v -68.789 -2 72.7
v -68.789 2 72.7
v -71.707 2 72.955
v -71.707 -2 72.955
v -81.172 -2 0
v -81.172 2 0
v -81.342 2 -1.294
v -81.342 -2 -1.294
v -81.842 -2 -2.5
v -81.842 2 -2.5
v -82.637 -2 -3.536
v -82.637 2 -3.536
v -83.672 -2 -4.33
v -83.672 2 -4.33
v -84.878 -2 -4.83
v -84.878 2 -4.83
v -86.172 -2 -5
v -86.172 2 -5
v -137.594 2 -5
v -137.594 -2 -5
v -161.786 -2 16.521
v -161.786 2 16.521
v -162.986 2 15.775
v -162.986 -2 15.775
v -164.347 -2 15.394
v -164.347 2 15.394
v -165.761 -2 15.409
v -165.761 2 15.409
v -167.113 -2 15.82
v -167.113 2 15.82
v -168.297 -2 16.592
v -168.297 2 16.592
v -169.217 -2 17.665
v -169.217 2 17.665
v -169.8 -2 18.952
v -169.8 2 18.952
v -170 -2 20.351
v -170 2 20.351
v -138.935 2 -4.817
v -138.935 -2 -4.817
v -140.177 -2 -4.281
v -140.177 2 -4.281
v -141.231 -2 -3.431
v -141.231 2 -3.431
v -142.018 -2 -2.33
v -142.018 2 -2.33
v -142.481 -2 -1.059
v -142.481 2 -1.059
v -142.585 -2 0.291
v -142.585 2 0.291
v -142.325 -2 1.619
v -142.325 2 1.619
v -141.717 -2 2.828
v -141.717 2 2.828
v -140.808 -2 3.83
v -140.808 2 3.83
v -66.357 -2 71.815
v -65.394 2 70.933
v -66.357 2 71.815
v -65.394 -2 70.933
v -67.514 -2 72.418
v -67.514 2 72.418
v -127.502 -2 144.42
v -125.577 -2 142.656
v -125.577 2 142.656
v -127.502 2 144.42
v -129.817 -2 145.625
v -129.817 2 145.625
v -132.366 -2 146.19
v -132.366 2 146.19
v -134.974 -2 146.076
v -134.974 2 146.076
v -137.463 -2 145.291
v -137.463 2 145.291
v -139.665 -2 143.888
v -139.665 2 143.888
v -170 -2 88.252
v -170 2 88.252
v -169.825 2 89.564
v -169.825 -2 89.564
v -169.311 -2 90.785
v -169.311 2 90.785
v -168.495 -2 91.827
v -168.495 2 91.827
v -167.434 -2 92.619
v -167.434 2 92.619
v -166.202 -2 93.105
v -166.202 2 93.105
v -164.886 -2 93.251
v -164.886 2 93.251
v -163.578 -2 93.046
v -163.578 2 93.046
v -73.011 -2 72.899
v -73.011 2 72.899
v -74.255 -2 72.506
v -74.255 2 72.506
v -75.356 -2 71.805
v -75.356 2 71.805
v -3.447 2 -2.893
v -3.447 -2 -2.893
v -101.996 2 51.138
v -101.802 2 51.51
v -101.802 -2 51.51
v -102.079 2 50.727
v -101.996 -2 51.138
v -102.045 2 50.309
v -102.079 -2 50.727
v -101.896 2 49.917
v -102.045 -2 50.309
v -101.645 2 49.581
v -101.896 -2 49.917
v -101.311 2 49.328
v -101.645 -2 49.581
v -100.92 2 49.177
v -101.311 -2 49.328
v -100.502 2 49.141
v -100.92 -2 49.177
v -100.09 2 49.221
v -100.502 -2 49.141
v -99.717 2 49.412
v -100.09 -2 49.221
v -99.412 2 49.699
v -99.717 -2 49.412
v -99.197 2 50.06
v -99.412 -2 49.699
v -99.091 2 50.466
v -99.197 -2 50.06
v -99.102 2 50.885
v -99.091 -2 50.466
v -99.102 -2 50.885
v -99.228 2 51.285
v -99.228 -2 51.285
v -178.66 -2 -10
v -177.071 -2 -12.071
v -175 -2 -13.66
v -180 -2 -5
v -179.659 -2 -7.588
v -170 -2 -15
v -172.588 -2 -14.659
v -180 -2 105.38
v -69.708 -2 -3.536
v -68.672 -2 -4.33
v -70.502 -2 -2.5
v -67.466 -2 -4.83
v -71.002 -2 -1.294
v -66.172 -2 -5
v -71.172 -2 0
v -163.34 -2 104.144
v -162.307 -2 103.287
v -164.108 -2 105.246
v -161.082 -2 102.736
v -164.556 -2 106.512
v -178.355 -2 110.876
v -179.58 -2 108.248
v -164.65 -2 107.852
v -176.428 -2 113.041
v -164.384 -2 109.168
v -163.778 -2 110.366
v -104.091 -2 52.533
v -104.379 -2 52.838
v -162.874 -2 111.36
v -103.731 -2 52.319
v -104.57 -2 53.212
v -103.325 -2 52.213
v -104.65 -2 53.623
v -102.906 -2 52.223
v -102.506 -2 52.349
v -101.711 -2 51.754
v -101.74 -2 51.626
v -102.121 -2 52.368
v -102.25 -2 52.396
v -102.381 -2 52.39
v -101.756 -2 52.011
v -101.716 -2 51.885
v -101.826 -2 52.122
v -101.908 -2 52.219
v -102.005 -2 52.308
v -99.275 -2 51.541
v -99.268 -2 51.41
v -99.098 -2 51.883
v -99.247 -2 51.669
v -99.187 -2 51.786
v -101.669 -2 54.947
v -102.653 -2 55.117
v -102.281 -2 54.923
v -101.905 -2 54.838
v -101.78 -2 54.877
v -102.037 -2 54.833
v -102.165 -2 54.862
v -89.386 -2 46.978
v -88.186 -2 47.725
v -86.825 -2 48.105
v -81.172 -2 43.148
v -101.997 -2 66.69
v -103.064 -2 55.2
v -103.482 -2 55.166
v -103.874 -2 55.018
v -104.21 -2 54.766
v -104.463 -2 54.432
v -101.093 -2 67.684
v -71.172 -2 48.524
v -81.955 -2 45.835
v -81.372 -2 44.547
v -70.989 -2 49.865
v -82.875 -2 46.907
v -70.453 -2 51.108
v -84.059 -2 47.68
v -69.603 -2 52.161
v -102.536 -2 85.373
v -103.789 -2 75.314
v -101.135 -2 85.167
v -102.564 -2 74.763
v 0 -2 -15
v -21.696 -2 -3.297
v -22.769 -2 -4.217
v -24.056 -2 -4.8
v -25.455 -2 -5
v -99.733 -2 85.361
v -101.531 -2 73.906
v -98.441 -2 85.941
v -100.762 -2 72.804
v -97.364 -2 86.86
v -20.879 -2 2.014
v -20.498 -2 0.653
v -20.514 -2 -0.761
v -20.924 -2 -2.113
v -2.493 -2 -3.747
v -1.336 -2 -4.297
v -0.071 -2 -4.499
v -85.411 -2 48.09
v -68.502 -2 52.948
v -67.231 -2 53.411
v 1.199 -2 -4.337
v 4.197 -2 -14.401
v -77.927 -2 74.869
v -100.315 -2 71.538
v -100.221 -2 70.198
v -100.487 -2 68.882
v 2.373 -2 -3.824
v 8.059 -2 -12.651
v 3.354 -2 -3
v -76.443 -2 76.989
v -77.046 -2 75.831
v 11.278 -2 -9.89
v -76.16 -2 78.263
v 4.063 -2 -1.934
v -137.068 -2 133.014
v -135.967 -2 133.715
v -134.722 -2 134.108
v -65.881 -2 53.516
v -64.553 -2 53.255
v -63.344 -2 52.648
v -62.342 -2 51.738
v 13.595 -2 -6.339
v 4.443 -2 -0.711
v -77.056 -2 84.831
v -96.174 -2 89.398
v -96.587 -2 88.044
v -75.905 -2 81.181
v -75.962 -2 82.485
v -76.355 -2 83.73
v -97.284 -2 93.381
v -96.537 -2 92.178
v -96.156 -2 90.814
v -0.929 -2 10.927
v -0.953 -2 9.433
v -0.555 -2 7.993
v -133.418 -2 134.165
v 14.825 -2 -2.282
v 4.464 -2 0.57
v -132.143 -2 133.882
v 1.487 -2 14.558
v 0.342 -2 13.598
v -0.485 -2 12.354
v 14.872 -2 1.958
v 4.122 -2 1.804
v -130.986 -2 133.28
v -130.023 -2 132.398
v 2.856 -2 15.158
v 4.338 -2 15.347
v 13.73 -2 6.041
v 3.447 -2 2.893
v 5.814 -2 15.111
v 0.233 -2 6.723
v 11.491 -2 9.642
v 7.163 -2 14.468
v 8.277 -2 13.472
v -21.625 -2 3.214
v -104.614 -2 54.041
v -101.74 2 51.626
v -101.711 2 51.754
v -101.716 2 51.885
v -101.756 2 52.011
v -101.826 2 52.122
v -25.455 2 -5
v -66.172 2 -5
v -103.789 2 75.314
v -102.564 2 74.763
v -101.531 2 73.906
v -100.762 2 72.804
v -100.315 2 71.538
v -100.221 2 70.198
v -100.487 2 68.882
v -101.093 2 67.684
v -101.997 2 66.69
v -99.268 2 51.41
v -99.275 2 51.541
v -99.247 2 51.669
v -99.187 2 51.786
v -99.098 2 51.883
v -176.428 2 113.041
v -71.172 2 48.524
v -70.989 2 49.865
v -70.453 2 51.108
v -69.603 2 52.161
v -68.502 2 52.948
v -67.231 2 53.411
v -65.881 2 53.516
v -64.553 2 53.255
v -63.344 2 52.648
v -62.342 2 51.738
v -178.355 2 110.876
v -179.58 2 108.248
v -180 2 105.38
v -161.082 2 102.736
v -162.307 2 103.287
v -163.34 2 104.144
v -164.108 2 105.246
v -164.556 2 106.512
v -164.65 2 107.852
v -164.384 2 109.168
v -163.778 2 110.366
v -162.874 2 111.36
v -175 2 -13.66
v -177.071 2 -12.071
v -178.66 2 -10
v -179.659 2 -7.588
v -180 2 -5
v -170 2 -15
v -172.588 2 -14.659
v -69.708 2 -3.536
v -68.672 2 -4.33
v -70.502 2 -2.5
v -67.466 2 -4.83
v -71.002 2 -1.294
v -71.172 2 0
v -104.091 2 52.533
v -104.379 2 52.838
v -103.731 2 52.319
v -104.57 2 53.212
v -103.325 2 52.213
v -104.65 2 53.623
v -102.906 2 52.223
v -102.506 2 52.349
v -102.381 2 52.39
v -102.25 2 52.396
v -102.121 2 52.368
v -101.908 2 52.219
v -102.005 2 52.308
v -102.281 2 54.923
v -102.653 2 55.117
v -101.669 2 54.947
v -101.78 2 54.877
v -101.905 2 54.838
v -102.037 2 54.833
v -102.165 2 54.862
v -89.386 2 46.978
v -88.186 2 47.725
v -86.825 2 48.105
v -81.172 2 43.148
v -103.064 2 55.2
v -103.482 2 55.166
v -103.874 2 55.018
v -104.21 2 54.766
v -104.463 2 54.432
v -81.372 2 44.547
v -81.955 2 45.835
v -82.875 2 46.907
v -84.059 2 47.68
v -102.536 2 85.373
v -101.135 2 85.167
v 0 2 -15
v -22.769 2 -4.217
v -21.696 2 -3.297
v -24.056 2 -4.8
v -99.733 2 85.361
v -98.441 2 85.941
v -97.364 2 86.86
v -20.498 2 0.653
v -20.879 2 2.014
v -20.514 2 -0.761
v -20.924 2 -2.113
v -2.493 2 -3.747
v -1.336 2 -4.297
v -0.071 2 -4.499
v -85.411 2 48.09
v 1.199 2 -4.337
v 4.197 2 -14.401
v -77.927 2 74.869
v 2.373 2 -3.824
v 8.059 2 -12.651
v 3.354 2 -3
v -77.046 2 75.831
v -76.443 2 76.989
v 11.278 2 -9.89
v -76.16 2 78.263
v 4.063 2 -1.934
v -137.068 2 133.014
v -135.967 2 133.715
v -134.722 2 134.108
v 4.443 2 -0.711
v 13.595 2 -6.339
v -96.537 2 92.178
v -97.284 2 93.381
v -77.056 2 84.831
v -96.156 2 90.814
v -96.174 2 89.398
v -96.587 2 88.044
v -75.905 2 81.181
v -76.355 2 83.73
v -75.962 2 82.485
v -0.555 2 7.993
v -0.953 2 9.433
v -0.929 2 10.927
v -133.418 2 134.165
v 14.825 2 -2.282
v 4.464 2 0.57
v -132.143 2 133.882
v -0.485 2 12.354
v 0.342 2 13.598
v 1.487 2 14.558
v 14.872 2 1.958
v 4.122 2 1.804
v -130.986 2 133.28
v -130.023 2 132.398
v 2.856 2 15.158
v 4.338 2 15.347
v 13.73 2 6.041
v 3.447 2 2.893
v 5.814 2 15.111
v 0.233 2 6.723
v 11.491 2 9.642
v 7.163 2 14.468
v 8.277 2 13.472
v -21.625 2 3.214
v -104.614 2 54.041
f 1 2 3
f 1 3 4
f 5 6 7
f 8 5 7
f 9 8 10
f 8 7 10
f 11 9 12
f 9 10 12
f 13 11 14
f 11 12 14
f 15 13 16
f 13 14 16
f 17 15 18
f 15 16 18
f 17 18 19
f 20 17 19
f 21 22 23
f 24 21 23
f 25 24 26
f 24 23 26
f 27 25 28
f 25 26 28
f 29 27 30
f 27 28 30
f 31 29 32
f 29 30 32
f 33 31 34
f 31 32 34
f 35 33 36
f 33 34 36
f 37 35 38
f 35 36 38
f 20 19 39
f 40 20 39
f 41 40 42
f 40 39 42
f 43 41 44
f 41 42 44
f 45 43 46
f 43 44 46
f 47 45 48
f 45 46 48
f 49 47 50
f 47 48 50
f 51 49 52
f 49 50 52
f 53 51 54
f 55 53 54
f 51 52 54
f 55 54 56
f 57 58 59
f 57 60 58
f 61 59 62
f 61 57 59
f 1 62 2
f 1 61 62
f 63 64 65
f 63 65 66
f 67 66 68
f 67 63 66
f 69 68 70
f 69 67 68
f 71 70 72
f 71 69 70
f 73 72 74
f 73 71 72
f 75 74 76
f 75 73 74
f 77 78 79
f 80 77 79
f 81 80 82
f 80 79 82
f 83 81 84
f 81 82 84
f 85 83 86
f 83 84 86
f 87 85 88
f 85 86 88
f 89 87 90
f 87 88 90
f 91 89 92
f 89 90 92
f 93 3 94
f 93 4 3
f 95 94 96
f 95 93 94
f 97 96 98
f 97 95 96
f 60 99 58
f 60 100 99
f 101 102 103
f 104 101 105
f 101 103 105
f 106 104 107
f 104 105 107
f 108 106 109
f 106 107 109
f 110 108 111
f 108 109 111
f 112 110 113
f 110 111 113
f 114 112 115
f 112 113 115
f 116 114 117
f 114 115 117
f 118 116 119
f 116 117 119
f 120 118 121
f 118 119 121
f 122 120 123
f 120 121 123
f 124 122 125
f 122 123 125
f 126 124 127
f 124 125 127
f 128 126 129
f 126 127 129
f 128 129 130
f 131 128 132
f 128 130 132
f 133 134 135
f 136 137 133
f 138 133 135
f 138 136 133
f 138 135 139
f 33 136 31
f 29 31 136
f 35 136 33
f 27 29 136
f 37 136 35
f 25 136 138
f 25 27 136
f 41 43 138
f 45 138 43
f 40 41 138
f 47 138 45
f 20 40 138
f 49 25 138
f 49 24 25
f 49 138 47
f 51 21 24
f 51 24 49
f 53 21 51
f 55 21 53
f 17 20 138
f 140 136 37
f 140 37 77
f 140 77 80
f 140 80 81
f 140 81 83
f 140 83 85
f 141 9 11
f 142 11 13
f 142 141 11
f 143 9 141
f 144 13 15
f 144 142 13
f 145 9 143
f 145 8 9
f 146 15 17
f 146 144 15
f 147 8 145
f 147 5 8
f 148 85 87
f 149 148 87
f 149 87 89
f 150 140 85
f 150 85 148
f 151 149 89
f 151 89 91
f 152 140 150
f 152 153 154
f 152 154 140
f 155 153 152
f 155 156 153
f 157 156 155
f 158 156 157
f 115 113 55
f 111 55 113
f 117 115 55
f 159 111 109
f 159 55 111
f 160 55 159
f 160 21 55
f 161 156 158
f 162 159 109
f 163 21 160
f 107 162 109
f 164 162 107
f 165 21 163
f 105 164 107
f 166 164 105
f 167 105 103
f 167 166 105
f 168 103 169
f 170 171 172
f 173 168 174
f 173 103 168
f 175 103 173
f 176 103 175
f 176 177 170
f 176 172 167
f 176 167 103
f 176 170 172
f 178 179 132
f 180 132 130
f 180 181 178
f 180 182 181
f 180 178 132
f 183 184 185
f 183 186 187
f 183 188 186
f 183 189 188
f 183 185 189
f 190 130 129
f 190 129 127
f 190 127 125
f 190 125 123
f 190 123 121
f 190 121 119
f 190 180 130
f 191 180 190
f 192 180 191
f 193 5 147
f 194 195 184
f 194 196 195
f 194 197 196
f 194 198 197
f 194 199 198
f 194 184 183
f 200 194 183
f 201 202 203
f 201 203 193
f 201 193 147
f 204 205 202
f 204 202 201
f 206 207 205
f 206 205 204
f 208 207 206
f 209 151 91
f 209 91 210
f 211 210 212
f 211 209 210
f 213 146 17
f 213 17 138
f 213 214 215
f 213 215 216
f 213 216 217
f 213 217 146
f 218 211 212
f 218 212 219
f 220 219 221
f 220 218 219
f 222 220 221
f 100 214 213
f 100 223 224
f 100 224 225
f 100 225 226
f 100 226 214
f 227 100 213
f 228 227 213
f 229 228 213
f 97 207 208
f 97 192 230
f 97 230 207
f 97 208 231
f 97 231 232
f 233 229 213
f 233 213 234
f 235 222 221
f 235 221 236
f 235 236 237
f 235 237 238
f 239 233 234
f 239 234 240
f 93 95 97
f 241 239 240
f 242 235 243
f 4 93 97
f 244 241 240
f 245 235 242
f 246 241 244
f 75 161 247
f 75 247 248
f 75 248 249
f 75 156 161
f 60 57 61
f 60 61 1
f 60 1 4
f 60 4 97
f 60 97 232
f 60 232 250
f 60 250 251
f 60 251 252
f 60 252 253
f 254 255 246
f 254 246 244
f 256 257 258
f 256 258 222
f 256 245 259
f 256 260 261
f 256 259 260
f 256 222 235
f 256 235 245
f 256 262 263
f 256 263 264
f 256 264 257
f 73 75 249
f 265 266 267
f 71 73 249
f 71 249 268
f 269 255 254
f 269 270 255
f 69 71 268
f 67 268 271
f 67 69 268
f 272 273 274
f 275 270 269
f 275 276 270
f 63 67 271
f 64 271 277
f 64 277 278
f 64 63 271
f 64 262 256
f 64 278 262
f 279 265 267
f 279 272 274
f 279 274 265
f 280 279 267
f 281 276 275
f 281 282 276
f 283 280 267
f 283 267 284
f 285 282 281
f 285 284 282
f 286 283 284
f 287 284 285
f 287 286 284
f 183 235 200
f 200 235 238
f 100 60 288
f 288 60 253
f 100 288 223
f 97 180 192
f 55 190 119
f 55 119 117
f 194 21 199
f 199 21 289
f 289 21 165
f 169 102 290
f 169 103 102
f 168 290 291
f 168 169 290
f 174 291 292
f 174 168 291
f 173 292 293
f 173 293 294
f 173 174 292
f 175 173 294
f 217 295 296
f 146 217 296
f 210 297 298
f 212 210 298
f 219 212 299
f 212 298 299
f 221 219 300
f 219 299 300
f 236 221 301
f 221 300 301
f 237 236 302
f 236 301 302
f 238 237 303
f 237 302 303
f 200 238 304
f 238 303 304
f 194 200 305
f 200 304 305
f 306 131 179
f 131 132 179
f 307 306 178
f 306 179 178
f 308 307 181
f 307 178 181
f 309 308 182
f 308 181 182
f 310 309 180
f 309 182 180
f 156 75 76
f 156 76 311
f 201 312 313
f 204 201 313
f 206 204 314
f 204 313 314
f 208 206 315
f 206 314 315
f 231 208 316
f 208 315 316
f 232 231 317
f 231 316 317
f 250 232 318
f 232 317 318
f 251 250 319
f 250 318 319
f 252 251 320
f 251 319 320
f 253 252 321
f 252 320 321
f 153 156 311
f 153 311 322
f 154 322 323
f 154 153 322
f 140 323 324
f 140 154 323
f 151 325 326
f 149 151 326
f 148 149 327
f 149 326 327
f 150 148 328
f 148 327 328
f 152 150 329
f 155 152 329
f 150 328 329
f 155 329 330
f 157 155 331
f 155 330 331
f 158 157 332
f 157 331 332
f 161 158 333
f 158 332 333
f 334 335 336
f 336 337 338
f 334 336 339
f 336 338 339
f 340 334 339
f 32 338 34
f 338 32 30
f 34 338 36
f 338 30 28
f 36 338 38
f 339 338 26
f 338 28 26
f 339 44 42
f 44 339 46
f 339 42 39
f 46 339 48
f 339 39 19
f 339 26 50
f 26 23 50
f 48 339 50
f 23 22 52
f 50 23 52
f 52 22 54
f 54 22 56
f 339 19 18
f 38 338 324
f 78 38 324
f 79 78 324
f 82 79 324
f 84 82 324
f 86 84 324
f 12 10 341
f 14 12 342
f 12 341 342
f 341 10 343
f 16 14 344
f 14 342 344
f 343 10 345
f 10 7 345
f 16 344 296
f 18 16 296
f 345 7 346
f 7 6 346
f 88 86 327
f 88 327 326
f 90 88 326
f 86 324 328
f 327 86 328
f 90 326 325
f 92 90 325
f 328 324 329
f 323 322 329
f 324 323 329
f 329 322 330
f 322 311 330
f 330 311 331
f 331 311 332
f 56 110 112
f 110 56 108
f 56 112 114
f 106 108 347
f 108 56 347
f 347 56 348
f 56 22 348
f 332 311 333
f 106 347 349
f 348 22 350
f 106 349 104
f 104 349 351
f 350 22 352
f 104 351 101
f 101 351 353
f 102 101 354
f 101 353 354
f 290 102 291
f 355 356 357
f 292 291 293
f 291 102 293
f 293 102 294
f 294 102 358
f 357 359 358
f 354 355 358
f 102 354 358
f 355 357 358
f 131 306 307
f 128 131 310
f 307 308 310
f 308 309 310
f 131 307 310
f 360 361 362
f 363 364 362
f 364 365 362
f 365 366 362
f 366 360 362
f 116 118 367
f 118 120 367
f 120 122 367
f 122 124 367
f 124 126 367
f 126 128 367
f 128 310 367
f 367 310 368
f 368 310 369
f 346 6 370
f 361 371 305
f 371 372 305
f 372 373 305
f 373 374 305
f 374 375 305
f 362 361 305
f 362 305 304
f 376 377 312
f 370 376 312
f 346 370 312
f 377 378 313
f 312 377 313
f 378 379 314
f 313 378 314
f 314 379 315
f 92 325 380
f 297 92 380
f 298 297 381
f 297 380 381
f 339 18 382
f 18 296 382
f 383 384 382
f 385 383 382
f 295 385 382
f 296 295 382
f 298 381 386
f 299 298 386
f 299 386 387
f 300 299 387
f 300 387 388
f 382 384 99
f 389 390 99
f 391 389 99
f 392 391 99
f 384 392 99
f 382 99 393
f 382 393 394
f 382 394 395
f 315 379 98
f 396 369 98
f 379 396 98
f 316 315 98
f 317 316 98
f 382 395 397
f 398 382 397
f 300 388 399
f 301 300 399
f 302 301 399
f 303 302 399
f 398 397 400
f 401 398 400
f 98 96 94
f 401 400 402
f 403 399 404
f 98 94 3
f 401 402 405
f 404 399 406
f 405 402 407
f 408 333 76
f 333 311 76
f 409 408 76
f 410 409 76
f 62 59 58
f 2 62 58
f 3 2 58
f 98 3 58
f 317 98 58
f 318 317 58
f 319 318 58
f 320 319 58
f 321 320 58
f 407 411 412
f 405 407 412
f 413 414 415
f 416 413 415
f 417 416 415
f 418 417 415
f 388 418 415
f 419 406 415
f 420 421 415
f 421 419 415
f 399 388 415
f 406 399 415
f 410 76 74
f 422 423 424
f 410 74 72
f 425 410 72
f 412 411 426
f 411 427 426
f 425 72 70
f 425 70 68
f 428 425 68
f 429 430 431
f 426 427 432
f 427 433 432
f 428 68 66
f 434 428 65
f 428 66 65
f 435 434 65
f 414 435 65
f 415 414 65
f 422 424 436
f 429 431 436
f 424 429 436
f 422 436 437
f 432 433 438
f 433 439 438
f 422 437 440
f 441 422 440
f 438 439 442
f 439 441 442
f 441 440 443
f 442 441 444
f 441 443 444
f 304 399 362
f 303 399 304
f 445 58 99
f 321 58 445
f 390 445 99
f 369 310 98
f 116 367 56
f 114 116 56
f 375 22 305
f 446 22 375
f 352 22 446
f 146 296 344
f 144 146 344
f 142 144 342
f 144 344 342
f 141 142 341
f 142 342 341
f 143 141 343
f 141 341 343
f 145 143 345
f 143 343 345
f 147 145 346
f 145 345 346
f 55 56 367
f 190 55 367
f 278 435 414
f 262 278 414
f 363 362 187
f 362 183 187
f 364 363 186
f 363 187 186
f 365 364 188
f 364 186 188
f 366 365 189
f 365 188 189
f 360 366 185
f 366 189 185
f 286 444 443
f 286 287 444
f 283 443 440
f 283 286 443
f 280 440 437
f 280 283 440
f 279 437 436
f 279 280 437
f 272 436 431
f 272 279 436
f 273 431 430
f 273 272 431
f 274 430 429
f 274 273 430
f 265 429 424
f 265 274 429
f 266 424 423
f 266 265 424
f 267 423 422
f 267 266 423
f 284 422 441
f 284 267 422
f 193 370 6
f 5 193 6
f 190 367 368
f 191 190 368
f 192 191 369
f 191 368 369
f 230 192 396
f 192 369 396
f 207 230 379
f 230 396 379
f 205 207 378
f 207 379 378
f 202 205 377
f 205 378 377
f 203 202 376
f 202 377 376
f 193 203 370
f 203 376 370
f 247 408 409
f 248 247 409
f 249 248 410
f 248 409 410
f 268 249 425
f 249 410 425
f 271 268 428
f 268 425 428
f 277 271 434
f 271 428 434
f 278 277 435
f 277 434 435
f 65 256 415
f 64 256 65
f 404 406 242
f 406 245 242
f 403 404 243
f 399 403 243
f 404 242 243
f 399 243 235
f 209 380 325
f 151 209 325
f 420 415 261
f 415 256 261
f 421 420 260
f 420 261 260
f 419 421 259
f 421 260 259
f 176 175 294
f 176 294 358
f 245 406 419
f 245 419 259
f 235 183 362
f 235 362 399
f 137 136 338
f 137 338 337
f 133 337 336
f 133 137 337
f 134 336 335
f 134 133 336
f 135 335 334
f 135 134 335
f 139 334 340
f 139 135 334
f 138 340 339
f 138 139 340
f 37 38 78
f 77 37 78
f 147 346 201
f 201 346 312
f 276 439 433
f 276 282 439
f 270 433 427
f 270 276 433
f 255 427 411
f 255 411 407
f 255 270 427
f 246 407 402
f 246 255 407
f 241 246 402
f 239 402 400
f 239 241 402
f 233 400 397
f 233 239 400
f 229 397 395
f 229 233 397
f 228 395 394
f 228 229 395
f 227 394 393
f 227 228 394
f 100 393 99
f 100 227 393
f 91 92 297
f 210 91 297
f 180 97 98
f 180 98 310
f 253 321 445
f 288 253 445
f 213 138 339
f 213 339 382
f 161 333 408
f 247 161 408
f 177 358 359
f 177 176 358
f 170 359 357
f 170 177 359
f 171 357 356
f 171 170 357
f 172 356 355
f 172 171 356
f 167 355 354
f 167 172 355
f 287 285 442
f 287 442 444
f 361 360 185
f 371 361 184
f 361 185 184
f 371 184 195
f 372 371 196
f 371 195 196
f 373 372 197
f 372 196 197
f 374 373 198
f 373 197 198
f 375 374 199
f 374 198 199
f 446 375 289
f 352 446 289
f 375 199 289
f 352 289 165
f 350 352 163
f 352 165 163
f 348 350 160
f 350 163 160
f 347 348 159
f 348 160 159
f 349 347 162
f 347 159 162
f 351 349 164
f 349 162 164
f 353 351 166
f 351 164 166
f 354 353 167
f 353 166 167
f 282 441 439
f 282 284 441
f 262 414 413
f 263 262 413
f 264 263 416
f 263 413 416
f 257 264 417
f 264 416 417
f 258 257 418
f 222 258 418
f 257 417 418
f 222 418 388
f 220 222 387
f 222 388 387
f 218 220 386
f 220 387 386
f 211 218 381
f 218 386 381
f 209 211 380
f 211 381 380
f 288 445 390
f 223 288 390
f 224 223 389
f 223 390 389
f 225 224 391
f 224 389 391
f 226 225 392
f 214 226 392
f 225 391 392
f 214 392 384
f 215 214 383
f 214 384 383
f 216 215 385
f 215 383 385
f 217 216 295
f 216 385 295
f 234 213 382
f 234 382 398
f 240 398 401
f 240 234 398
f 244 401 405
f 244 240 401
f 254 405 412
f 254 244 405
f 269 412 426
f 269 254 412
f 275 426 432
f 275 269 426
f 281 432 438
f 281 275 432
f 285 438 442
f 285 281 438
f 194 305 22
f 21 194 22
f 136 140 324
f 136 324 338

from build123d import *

# Parameters (mm, degrees)
F1_DEPTH = 2
F2_SIZE  = 5
F3_R     = 5
F4_R     = 1.5
F5_DEPTH = 4.001
F6_R     = 0.5
F7_R     = 0.5
F9_DEPTH = 4.001


with BuildPart() as f1:
    # F0 (on Front) → F1 (new body, symmetric)
    with BuildSketch(Plane.XZ):
        with BuildLine():
            ThreePointArc((3.447199994, 2.8925442436), (2.8925442436, -3.447199994), (-3.447199994, -2.8925442436))
            Line((-3.447199994, -2.8925442436), (-69.9395102904, 76.349905432))
            Line((-69.9395102904, 76.349905432), (-100.5812880152, 50.6384010446))
            Line((-100.5812880152, 50.6384010446), (-103.1524384539, 53.7025788171))
            Line((-103.1524384539, 53.7025788171), (-72.5106607292, 79.4140832045))
            Line((-72.5106607292, 79.4140832045), (-125.5768458345, 142.655899949))
            ThreePointArc((-125.5768458345, 142.655899949), (-132.3657328382, 146.1899708331), (-139.6651663625, 143.8884682833))
            Line((-139.6651663625, 143.8884682833), (-176.4278760969, 113.0408921042))
            ThreePointArc((-176.4278760969, 113.0408921042), (-179.0630778704, 109.6066302904), (-180, 105.380447673))
            Line((-180, 105.380447673), (-180, -5))
            ThreePointArc((-180, -5), (-177.0710678119, -12.0710678119), (-170, -15))
            Line((-170, -15), (0, -15))
            ThreePointArc((0, -15), (13.5946168055, -6.3392739261), (11.4906666468, 9.6418141453))
            Line((11.4906666468, 9.6418141453), (8.2767285984, 13.4720363609))
            ThreePointArc((8.2767285984, 13.4720363609), (0.8803603211, 14.1191347364), (0.2332619456, 6.7227664592))
            Line((0.2332619456, 6.7227664592), (3.447199994, 2.8925442436))
        make_face()
    extrude(amount=F1_DEPTH, both=True)

    # F2
    f2_edges = [f1.edges().sort_by_distance(p)[0] for p in [
        (-72.510661, 0, 79.414083),
        (-69.93951, 0, 76.349905),
    ]]
    chamfer(f2_edges, length=F2_SIZE)

    # F3
    f3_edges = [f1.edges().sort_by_distance(p)[0] for p in [
        (-75.724599, 0, 83.244305),
        (-76.340883, 0, 76.200145),
        (-73.769733, 0, 73.135967),
        (-66.725572, 0, 72.519683),
    ]]
    fillet(f3_edges, radius=F3_R)

    # F4 (on face) → F5 (cut, through all)
    with BuildSketch(Plane.XZ.offset(2)):
        with Locations((-103.1524384539, 53.7025788171)):
            Circle(F4_R)
        with Locations((-100.5812880152, 50.6384010446)):
            Circle(F4_R)
    extrude(amount=-F5_DEPTH, mode=Mode.SUBTRACT)

    # F6
    f6_edges = [f1.edges().sort_by_distance(p)[0] for p in [
        (-102.003372, 0, 54.66676),
        (-99.432221, 0, 51.602582),
    ]]
    fillet(f6_edges, radius=F6_R)

    # F7
    f7_edges = [f1.edges().sort_by_distance(p)[0] for p in [
        (-102.188257, 0, 52.553512),
        (-101.545469, 0, 51.787468),
    ]]
    fillet(f7_edges, radius=F7_R)

    # F8 (on face) → F9 (cut, through all)
    with BuildSketch(Plane(origin=(0, 2, 0), x_dir=(-1, 0, 0), z_dir=(0, 1, 0))):
        with BuildLine():
            Line((130.0233522172, 132.3978016366), (97.2839774935, 93.3805341903))
            ThreePointArc((97.2839774935, 93.3805341903), (96.9332114879, 87.4244550998), (102.535824002, 85.3729561501))
            Line((102.535824002, 85.3729561501), (161.082054837, 102.7357001516))
            ThreePointArc((161.082054837, 102.7357001516), (164.5558221931, 106.5119215459), (162.8743685925, 111.3595623589))
            Line((162.8743685925, 111.3595623589), (137.0675124813, 133.0140858037))
            ThreePointArc((137.0675124813, 133.0140858037), (133.4177957191, 134.1648370786), (130.0233522172, 132.3978016366))
        make_face()
        with BuildLine():
            ThreePointArc((103.7888820535, 75.3140818256), (100.3151146973, 71.5378604313), (101.9965682979, 66.6902196183))
            Line((101.9965682979, 66.6902196183), (161.7860619516, 16.5208775452))
            ThreePointArc((161.7860619516, 16.5208775452), (167.1130913087, 15.8195608256), (170, 20.3510997608))
            Line((170, 20.3510997608), (170, 88.2518936709))
            ThreePointArc((170, 88.2518936709), (167.9909763068, 92.2586455639), (163.5783757071, 93.0455336626))
            Line((163.5783757071, 93.0455336626), (103.7888820535, 75.3140818256))
        make_face()
        with BuildLine():
            Line((81.1720786248, 43.1480539897), (81.1720786248, 0))
            ThreePointArc((81.1720786248, 0), (82.6365447188, -3.5355339059), (86.1720786248, -5))
            Line((86.1720786248, -5), (137.5939269804, -5))
            ThreePointArc((137.5939269804, -5), (142.2923900843, -1.7101007166), (140.8078650288, 3.8302222156))
            Line((140.8078650288, 3.8302222156), (89.3860166732, 46.9782762053))
            ThreePointArc((89.3860166732, 46.9782762053), (84.0589873161, 47.6795929249), (81.1720786248, 43.1480539897))
        make_face()
        with BuildLine():
            Line((62.3418564092, 51.7381358551), (21.6252199264, 3.2139380484))
            ThreePointArc((21.6252199264, 3.2139380484), (20.9239032068, -2.1130913087), (25.455442142, -5))
            Line((25.455442142, -5), (66.1720786248, -5))
            ThreePointArc((66.1720786248, -5), (69.7076125307, -3.5355339059), (71.1720786248, 0))
            Line((71.1720786248, 0), (71.1720786248, 48.5241978067))
            ThreePointArc((71.1720786248, 48.5241978067), (67.8821793414, 53.2226609106), (62.3418564092, 51.7381358551))
        make_face()
    extrude(amount=-F9_DEPTH, mode=Mode.SUBTRACT)


solid = f1.part
